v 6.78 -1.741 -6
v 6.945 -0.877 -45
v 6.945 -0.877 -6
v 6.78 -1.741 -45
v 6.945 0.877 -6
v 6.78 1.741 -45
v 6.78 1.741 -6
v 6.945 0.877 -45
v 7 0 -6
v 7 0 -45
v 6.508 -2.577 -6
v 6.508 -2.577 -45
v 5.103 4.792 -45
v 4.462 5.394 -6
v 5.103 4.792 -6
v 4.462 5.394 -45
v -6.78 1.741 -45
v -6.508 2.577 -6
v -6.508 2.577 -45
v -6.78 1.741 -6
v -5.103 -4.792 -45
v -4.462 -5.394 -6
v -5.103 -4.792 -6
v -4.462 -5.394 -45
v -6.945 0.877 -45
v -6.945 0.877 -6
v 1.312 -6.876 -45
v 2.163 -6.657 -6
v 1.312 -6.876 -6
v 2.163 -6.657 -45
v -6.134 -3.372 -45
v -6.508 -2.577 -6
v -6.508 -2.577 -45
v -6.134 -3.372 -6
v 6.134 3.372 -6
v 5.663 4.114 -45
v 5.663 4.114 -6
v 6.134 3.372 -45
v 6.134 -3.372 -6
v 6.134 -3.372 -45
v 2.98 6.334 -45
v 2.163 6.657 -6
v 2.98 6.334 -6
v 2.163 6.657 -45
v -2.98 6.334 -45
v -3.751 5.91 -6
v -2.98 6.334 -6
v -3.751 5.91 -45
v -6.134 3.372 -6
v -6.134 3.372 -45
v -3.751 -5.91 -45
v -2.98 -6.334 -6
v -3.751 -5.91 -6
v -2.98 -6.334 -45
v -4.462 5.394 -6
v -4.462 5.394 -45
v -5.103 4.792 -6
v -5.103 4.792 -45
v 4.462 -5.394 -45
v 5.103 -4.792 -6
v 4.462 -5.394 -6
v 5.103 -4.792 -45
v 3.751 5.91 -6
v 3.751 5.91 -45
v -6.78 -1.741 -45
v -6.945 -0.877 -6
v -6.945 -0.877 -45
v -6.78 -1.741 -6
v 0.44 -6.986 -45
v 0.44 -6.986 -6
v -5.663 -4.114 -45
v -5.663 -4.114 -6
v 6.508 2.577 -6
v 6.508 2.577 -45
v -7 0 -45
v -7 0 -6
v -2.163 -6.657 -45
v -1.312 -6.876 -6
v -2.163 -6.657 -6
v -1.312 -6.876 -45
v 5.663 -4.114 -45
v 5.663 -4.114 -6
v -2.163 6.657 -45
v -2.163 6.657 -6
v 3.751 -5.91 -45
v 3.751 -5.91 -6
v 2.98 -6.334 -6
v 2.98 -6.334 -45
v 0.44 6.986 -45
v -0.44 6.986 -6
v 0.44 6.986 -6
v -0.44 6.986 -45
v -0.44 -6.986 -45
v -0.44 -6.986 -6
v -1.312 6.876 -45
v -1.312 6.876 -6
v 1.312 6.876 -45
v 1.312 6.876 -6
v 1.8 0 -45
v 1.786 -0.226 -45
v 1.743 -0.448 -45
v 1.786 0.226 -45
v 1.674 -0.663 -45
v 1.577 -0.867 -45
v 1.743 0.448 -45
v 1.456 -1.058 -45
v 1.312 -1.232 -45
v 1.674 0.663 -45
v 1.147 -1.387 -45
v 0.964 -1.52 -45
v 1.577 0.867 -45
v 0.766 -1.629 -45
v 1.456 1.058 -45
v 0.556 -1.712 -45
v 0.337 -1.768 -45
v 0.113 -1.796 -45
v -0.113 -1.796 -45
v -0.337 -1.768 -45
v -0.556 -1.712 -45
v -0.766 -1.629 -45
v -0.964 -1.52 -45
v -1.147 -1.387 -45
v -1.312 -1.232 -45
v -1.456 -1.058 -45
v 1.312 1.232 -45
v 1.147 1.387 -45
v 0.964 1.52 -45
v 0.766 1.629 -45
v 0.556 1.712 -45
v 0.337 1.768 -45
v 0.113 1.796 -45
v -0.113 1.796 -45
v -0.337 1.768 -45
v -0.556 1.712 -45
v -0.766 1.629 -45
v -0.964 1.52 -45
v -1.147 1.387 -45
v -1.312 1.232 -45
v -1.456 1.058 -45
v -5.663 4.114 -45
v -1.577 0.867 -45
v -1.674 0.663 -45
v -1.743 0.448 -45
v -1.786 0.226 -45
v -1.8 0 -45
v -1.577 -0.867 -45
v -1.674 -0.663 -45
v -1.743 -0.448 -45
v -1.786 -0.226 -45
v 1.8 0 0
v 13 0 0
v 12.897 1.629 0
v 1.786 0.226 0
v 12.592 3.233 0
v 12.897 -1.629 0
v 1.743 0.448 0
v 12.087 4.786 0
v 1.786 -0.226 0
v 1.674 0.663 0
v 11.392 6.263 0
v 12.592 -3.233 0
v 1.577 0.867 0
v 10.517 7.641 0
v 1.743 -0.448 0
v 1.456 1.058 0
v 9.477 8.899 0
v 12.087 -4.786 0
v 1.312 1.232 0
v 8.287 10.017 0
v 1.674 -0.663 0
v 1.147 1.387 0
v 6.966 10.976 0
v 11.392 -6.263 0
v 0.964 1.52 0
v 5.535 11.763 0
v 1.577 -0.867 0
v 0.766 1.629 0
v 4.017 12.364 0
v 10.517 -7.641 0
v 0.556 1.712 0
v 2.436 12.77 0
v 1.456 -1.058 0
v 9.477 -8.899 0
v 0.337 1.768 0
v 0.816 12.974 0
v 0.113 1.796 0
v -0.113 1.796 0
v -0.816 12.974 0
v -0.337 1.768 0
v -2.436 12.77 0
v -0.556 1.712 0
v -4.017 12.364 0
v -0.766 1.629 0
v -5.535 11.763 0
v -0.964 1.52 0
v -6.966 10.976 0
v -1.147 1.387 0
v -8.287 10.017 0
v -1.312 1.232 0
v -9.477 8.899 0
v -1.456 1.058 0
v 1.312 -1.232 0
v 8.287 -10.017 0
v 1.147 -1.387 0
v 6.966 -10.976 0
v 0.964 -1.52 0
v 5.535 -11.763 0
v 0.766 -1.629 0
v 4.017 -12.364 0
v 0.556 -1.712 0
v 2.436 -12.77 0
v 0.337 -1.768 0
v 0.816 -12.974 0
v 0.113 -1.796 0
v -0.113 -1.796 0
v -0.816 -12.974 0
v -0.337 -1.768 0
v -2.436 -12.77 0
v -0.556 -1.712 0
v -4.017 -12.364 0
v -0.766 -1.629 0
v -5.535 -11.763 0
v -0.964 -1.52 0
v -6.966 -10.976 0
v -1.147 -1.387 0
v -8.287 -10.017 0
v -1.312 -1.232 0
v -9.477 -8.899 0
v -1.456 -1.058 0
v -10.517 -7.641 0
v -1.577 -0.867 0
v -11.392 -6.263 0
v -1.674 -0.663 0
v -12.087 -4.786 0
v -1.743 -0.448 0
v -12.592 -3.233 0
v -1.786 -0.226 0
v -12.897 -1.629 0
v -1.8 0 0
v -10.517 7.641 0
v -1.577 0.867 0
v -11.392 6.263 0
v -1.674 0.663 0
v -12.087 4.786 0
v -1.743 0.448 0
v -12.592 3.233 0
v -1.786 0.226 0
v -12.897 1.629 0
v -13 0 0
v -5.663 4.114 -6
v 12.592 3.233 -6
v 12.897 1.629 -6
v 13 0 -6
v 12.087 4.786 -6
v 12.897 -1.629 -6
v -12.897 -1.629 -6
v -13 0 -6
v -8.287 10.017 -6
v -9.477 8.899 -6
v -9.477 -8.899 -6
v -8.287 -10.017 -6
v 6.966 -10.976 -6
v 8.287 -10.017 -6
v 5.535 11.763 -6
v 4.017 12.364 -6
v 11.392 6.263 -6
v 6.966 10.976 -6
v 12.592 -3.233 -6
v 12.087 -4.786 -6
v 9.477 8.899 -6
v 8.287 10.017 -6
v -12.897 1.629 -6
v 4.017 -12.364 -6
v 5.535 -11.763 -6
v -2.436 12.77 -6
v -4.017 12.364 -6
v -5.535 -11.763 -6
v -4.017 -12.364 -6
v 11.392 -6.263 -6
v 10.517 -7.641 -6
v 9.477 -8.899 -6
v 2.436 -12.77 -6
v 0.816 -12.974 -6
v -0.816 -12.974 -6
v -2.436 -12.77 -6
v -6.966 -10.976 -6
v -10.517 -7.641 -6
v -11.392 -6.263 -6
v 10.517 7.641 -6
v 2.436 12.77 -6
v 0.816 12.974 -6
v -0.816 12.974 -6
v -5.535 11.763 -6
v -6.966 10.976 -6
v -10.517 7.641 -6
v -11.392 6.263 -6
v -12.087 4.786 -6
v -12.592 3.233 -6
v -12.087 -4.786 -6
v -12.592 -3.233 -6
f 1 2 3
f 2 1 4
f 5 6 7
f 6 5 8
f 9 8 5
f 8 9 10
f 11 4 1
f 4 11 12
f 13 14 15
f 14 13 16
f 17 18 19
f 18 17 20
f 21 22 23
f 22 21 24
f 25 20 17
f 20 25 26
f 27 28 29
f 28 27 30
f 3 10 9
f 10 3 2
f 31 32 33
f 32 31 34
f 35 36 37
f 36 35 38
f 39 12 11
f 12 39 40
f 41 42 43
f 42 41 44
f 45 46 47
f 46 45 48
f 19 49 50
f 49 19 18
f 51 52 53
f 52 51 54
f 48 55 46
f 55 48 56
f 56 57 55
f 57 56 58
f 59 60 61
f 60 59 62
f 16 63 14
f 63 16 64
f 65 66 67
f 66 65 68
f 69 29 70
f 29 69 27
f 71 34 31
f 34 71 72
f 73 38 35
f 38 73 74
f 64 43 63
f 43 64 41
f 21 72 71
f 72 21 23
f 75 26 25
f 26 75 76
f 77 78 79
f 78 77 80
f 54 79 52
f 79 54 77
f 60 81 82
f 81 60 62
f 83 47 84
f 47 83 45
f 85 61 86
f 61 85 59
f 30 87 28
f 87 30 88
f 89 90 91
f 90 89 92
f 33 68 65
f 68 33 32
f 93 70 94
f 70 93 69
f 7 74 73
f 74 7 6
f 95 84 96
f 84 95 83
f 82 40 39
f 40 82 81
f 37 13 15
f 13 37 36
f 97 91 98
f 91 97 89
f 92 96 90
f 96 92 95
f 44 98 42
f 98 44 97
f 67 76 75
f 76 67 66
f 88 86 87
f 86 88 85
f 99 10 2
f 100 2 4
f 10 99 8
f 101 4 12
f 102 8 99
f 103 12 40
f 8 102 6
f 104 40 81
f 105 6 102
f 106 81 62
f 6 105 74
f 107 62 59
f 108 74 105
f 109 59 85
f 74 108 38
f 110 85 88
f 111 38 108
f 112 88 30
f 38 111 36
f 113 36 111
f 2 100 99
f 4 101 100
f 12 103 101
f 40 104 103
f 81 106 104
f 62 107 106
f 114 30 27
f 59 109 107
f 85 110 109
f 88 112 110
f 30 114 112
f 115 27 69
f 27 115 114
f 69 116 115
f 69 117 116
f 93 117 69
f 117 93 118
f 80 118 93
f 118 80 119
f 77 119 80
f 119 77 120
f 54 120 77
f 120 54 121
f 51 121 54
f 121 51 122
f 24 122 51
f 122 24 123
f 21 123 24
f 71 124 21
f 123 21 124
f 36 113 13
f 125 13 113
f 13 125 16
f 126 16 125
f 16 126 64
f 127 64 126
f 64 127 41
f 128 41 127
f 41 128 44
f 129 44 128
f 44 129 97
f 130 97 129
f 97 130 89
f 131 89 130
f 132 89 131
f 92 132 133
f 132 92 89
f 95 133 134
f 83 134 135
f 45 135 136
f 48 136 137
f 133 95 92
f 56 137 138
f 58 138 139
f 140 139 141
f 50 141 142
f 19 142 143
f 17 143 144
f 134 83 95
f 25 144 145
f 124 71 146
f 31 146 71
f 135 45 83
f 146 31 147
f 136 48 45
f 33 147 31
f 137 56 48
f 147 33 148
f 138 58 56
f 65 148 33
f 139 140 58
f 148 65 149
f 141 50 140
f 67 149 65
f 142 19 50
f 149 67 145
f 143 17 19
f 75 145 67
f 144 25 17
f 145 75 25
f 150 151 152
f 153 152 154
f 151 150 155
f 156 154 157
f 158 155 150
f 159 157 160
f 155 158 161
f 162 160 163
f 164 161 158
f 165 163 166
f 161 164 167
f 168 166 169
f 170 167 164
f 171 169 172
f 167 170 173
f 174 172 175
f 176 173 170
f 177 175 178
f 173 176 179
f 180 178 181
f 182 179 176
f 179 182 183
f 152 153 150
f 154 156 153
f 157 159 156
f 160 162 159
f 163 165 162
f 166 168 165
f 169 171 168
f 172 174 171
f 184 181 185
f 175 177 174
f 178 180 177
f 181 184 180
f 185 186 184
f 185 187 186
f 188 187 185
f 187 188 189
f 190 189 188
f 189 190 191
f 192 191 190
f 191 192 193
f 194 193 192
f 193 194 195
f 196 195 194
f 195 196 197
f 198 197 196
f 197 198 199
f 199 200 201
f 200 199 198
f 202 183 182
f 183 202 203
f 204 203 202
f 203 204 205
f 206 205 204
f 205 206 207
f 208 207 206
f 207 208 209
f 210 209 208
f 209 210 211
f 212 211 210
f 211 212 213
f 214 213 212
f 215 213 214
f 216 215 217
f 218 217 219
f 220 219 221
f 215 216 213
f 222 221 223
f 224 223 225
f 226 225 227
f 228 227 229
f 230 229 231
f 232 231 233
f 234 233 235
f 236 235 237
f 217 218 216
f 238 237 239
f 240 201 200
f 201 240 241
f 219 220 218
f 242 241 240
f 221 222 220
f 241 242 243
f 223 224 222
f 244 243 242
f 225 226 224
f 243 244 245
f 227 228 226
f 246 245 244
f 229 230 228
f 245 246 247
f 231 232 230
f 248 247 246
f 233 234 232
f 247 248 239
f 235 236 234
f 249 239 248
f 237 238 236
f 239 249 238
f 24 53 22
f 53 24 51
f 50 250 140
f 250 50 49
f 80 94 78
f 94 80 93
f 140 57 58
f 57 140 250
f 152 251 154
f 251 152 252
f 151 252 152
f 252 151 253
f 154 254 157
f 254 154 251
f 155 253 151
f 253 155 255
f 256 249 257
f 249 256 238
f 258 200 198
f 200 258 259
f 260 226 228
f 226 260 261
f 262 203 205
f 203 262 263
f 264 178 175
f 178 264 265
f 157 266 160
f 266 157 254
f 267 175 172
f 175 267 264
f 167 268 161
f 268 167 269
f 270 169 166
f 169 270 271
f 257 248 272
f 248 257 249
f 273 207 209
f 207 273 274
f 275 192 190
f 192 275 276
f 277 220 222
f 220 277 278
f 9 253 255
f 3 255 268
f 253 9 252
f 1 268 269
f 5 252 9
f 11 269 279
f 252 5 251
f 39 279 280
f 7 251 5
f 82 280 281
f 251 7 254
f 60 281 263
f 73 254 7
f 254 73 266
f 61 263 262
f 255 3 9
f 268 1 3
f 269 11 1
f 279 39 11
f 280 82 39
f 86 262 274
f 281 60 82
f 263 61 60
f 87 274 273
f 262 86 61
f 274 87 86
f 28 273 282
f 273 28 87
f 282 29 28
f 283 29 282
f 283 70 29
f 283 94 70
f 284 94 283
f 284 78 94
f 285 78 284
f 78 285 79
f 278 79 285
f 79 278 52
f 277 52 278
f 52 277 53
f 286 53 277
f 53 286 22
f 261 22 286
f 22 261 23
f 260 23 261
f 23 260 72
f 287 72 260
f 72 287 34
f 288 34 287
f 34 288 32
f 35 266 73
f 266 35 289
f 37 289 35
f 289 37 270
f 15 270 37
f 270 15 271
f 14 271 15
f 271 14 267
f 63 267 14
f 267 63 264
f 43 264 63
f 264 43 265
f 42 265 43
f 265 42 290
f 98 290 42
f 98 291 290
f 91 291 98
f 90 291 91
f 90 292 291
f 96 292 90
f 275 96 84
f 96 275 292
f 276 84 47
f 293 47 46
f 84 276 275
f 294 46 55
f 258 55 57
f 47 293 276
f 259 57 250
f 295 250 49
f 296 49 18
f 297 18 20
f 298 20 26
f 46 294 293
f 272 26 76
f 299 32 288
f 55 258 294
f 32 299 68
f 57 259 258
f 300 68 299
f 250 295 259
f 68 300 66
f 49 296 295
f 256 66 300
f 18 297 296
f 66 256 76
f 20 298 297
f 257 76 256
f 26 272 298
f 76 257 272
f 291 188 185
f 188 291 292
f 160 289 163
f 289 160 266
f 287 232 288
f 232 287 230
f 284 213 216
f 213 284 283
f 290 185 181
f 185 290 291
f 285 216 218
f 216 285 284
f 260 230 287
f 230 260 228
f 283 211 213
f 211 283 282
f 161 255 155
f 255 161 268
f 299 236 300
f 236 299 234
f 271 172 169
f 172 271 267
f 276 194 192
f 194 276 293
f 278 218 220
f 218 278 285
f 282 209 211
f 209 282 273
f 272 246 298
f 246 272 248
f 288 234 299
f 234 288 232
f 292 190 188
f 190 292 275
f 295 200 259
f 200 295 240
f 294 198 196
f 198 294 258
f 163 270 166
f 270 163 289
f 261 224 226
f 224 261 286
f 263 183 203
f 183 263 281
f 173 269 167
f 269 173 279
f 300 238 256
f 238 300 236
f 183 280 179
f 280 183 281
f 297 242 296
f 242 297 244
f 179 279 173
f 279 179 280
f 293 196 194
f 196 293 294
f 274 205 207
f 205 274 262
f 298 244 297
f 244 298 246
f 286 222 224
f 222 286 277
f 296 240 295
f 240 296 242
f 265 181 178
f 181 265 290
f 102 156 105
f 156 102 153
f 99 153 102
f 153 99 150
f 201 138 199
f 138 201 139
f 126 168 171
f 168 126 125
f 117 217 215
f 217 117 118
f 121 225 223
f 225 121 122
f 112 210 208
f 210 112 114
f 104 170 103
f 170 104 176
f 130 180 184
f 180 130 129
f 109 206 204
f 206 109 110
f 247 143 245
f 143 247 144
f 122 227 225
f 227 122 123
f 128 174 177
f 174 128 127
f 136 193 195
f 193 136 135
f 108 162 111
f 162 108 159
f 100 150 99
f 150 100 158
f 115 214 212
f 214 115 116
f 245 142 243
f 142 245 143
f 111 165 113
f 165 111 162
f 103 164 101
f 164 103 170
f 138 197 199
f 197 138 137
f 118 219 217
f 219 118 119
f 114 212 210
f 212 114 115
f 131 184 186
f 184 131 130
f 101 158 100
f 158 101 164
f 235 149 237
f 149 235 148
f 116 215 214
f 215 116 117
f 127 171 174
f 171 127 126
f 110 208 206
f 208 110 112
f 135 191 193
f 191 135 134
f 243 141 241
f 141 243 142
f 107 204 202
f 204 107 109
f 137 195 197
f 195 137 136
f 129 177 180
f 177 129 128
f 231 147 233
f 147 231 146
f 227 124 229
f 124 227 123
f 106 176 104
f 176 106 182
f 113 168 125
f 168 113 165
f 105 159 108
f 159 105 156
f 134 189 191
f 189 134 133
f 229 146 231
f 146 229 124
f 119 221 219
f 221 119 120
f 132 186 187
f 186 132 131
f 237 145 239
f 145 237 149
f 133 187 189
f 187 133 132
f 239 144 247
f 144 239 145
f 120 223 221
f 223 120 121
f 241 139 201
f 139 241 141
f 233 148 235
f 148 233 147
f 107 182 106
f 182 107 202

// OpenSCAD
$fn = 50;


difference() {
	union() {
		translate(v = [0, 0, -45.0000000000]) {
			cylinder(h = 45, r = 7.0000000000);
		}
		translate(v = [0, 0, -6.0000000000]) {
			cylinder(h = 6, r = 13.0000000000);
		}
	}
	union() {
		#translate(v = [0, 0, -45]) {
			cylinder(h = 45, r = 1.8000000000);
		}
	}
}
